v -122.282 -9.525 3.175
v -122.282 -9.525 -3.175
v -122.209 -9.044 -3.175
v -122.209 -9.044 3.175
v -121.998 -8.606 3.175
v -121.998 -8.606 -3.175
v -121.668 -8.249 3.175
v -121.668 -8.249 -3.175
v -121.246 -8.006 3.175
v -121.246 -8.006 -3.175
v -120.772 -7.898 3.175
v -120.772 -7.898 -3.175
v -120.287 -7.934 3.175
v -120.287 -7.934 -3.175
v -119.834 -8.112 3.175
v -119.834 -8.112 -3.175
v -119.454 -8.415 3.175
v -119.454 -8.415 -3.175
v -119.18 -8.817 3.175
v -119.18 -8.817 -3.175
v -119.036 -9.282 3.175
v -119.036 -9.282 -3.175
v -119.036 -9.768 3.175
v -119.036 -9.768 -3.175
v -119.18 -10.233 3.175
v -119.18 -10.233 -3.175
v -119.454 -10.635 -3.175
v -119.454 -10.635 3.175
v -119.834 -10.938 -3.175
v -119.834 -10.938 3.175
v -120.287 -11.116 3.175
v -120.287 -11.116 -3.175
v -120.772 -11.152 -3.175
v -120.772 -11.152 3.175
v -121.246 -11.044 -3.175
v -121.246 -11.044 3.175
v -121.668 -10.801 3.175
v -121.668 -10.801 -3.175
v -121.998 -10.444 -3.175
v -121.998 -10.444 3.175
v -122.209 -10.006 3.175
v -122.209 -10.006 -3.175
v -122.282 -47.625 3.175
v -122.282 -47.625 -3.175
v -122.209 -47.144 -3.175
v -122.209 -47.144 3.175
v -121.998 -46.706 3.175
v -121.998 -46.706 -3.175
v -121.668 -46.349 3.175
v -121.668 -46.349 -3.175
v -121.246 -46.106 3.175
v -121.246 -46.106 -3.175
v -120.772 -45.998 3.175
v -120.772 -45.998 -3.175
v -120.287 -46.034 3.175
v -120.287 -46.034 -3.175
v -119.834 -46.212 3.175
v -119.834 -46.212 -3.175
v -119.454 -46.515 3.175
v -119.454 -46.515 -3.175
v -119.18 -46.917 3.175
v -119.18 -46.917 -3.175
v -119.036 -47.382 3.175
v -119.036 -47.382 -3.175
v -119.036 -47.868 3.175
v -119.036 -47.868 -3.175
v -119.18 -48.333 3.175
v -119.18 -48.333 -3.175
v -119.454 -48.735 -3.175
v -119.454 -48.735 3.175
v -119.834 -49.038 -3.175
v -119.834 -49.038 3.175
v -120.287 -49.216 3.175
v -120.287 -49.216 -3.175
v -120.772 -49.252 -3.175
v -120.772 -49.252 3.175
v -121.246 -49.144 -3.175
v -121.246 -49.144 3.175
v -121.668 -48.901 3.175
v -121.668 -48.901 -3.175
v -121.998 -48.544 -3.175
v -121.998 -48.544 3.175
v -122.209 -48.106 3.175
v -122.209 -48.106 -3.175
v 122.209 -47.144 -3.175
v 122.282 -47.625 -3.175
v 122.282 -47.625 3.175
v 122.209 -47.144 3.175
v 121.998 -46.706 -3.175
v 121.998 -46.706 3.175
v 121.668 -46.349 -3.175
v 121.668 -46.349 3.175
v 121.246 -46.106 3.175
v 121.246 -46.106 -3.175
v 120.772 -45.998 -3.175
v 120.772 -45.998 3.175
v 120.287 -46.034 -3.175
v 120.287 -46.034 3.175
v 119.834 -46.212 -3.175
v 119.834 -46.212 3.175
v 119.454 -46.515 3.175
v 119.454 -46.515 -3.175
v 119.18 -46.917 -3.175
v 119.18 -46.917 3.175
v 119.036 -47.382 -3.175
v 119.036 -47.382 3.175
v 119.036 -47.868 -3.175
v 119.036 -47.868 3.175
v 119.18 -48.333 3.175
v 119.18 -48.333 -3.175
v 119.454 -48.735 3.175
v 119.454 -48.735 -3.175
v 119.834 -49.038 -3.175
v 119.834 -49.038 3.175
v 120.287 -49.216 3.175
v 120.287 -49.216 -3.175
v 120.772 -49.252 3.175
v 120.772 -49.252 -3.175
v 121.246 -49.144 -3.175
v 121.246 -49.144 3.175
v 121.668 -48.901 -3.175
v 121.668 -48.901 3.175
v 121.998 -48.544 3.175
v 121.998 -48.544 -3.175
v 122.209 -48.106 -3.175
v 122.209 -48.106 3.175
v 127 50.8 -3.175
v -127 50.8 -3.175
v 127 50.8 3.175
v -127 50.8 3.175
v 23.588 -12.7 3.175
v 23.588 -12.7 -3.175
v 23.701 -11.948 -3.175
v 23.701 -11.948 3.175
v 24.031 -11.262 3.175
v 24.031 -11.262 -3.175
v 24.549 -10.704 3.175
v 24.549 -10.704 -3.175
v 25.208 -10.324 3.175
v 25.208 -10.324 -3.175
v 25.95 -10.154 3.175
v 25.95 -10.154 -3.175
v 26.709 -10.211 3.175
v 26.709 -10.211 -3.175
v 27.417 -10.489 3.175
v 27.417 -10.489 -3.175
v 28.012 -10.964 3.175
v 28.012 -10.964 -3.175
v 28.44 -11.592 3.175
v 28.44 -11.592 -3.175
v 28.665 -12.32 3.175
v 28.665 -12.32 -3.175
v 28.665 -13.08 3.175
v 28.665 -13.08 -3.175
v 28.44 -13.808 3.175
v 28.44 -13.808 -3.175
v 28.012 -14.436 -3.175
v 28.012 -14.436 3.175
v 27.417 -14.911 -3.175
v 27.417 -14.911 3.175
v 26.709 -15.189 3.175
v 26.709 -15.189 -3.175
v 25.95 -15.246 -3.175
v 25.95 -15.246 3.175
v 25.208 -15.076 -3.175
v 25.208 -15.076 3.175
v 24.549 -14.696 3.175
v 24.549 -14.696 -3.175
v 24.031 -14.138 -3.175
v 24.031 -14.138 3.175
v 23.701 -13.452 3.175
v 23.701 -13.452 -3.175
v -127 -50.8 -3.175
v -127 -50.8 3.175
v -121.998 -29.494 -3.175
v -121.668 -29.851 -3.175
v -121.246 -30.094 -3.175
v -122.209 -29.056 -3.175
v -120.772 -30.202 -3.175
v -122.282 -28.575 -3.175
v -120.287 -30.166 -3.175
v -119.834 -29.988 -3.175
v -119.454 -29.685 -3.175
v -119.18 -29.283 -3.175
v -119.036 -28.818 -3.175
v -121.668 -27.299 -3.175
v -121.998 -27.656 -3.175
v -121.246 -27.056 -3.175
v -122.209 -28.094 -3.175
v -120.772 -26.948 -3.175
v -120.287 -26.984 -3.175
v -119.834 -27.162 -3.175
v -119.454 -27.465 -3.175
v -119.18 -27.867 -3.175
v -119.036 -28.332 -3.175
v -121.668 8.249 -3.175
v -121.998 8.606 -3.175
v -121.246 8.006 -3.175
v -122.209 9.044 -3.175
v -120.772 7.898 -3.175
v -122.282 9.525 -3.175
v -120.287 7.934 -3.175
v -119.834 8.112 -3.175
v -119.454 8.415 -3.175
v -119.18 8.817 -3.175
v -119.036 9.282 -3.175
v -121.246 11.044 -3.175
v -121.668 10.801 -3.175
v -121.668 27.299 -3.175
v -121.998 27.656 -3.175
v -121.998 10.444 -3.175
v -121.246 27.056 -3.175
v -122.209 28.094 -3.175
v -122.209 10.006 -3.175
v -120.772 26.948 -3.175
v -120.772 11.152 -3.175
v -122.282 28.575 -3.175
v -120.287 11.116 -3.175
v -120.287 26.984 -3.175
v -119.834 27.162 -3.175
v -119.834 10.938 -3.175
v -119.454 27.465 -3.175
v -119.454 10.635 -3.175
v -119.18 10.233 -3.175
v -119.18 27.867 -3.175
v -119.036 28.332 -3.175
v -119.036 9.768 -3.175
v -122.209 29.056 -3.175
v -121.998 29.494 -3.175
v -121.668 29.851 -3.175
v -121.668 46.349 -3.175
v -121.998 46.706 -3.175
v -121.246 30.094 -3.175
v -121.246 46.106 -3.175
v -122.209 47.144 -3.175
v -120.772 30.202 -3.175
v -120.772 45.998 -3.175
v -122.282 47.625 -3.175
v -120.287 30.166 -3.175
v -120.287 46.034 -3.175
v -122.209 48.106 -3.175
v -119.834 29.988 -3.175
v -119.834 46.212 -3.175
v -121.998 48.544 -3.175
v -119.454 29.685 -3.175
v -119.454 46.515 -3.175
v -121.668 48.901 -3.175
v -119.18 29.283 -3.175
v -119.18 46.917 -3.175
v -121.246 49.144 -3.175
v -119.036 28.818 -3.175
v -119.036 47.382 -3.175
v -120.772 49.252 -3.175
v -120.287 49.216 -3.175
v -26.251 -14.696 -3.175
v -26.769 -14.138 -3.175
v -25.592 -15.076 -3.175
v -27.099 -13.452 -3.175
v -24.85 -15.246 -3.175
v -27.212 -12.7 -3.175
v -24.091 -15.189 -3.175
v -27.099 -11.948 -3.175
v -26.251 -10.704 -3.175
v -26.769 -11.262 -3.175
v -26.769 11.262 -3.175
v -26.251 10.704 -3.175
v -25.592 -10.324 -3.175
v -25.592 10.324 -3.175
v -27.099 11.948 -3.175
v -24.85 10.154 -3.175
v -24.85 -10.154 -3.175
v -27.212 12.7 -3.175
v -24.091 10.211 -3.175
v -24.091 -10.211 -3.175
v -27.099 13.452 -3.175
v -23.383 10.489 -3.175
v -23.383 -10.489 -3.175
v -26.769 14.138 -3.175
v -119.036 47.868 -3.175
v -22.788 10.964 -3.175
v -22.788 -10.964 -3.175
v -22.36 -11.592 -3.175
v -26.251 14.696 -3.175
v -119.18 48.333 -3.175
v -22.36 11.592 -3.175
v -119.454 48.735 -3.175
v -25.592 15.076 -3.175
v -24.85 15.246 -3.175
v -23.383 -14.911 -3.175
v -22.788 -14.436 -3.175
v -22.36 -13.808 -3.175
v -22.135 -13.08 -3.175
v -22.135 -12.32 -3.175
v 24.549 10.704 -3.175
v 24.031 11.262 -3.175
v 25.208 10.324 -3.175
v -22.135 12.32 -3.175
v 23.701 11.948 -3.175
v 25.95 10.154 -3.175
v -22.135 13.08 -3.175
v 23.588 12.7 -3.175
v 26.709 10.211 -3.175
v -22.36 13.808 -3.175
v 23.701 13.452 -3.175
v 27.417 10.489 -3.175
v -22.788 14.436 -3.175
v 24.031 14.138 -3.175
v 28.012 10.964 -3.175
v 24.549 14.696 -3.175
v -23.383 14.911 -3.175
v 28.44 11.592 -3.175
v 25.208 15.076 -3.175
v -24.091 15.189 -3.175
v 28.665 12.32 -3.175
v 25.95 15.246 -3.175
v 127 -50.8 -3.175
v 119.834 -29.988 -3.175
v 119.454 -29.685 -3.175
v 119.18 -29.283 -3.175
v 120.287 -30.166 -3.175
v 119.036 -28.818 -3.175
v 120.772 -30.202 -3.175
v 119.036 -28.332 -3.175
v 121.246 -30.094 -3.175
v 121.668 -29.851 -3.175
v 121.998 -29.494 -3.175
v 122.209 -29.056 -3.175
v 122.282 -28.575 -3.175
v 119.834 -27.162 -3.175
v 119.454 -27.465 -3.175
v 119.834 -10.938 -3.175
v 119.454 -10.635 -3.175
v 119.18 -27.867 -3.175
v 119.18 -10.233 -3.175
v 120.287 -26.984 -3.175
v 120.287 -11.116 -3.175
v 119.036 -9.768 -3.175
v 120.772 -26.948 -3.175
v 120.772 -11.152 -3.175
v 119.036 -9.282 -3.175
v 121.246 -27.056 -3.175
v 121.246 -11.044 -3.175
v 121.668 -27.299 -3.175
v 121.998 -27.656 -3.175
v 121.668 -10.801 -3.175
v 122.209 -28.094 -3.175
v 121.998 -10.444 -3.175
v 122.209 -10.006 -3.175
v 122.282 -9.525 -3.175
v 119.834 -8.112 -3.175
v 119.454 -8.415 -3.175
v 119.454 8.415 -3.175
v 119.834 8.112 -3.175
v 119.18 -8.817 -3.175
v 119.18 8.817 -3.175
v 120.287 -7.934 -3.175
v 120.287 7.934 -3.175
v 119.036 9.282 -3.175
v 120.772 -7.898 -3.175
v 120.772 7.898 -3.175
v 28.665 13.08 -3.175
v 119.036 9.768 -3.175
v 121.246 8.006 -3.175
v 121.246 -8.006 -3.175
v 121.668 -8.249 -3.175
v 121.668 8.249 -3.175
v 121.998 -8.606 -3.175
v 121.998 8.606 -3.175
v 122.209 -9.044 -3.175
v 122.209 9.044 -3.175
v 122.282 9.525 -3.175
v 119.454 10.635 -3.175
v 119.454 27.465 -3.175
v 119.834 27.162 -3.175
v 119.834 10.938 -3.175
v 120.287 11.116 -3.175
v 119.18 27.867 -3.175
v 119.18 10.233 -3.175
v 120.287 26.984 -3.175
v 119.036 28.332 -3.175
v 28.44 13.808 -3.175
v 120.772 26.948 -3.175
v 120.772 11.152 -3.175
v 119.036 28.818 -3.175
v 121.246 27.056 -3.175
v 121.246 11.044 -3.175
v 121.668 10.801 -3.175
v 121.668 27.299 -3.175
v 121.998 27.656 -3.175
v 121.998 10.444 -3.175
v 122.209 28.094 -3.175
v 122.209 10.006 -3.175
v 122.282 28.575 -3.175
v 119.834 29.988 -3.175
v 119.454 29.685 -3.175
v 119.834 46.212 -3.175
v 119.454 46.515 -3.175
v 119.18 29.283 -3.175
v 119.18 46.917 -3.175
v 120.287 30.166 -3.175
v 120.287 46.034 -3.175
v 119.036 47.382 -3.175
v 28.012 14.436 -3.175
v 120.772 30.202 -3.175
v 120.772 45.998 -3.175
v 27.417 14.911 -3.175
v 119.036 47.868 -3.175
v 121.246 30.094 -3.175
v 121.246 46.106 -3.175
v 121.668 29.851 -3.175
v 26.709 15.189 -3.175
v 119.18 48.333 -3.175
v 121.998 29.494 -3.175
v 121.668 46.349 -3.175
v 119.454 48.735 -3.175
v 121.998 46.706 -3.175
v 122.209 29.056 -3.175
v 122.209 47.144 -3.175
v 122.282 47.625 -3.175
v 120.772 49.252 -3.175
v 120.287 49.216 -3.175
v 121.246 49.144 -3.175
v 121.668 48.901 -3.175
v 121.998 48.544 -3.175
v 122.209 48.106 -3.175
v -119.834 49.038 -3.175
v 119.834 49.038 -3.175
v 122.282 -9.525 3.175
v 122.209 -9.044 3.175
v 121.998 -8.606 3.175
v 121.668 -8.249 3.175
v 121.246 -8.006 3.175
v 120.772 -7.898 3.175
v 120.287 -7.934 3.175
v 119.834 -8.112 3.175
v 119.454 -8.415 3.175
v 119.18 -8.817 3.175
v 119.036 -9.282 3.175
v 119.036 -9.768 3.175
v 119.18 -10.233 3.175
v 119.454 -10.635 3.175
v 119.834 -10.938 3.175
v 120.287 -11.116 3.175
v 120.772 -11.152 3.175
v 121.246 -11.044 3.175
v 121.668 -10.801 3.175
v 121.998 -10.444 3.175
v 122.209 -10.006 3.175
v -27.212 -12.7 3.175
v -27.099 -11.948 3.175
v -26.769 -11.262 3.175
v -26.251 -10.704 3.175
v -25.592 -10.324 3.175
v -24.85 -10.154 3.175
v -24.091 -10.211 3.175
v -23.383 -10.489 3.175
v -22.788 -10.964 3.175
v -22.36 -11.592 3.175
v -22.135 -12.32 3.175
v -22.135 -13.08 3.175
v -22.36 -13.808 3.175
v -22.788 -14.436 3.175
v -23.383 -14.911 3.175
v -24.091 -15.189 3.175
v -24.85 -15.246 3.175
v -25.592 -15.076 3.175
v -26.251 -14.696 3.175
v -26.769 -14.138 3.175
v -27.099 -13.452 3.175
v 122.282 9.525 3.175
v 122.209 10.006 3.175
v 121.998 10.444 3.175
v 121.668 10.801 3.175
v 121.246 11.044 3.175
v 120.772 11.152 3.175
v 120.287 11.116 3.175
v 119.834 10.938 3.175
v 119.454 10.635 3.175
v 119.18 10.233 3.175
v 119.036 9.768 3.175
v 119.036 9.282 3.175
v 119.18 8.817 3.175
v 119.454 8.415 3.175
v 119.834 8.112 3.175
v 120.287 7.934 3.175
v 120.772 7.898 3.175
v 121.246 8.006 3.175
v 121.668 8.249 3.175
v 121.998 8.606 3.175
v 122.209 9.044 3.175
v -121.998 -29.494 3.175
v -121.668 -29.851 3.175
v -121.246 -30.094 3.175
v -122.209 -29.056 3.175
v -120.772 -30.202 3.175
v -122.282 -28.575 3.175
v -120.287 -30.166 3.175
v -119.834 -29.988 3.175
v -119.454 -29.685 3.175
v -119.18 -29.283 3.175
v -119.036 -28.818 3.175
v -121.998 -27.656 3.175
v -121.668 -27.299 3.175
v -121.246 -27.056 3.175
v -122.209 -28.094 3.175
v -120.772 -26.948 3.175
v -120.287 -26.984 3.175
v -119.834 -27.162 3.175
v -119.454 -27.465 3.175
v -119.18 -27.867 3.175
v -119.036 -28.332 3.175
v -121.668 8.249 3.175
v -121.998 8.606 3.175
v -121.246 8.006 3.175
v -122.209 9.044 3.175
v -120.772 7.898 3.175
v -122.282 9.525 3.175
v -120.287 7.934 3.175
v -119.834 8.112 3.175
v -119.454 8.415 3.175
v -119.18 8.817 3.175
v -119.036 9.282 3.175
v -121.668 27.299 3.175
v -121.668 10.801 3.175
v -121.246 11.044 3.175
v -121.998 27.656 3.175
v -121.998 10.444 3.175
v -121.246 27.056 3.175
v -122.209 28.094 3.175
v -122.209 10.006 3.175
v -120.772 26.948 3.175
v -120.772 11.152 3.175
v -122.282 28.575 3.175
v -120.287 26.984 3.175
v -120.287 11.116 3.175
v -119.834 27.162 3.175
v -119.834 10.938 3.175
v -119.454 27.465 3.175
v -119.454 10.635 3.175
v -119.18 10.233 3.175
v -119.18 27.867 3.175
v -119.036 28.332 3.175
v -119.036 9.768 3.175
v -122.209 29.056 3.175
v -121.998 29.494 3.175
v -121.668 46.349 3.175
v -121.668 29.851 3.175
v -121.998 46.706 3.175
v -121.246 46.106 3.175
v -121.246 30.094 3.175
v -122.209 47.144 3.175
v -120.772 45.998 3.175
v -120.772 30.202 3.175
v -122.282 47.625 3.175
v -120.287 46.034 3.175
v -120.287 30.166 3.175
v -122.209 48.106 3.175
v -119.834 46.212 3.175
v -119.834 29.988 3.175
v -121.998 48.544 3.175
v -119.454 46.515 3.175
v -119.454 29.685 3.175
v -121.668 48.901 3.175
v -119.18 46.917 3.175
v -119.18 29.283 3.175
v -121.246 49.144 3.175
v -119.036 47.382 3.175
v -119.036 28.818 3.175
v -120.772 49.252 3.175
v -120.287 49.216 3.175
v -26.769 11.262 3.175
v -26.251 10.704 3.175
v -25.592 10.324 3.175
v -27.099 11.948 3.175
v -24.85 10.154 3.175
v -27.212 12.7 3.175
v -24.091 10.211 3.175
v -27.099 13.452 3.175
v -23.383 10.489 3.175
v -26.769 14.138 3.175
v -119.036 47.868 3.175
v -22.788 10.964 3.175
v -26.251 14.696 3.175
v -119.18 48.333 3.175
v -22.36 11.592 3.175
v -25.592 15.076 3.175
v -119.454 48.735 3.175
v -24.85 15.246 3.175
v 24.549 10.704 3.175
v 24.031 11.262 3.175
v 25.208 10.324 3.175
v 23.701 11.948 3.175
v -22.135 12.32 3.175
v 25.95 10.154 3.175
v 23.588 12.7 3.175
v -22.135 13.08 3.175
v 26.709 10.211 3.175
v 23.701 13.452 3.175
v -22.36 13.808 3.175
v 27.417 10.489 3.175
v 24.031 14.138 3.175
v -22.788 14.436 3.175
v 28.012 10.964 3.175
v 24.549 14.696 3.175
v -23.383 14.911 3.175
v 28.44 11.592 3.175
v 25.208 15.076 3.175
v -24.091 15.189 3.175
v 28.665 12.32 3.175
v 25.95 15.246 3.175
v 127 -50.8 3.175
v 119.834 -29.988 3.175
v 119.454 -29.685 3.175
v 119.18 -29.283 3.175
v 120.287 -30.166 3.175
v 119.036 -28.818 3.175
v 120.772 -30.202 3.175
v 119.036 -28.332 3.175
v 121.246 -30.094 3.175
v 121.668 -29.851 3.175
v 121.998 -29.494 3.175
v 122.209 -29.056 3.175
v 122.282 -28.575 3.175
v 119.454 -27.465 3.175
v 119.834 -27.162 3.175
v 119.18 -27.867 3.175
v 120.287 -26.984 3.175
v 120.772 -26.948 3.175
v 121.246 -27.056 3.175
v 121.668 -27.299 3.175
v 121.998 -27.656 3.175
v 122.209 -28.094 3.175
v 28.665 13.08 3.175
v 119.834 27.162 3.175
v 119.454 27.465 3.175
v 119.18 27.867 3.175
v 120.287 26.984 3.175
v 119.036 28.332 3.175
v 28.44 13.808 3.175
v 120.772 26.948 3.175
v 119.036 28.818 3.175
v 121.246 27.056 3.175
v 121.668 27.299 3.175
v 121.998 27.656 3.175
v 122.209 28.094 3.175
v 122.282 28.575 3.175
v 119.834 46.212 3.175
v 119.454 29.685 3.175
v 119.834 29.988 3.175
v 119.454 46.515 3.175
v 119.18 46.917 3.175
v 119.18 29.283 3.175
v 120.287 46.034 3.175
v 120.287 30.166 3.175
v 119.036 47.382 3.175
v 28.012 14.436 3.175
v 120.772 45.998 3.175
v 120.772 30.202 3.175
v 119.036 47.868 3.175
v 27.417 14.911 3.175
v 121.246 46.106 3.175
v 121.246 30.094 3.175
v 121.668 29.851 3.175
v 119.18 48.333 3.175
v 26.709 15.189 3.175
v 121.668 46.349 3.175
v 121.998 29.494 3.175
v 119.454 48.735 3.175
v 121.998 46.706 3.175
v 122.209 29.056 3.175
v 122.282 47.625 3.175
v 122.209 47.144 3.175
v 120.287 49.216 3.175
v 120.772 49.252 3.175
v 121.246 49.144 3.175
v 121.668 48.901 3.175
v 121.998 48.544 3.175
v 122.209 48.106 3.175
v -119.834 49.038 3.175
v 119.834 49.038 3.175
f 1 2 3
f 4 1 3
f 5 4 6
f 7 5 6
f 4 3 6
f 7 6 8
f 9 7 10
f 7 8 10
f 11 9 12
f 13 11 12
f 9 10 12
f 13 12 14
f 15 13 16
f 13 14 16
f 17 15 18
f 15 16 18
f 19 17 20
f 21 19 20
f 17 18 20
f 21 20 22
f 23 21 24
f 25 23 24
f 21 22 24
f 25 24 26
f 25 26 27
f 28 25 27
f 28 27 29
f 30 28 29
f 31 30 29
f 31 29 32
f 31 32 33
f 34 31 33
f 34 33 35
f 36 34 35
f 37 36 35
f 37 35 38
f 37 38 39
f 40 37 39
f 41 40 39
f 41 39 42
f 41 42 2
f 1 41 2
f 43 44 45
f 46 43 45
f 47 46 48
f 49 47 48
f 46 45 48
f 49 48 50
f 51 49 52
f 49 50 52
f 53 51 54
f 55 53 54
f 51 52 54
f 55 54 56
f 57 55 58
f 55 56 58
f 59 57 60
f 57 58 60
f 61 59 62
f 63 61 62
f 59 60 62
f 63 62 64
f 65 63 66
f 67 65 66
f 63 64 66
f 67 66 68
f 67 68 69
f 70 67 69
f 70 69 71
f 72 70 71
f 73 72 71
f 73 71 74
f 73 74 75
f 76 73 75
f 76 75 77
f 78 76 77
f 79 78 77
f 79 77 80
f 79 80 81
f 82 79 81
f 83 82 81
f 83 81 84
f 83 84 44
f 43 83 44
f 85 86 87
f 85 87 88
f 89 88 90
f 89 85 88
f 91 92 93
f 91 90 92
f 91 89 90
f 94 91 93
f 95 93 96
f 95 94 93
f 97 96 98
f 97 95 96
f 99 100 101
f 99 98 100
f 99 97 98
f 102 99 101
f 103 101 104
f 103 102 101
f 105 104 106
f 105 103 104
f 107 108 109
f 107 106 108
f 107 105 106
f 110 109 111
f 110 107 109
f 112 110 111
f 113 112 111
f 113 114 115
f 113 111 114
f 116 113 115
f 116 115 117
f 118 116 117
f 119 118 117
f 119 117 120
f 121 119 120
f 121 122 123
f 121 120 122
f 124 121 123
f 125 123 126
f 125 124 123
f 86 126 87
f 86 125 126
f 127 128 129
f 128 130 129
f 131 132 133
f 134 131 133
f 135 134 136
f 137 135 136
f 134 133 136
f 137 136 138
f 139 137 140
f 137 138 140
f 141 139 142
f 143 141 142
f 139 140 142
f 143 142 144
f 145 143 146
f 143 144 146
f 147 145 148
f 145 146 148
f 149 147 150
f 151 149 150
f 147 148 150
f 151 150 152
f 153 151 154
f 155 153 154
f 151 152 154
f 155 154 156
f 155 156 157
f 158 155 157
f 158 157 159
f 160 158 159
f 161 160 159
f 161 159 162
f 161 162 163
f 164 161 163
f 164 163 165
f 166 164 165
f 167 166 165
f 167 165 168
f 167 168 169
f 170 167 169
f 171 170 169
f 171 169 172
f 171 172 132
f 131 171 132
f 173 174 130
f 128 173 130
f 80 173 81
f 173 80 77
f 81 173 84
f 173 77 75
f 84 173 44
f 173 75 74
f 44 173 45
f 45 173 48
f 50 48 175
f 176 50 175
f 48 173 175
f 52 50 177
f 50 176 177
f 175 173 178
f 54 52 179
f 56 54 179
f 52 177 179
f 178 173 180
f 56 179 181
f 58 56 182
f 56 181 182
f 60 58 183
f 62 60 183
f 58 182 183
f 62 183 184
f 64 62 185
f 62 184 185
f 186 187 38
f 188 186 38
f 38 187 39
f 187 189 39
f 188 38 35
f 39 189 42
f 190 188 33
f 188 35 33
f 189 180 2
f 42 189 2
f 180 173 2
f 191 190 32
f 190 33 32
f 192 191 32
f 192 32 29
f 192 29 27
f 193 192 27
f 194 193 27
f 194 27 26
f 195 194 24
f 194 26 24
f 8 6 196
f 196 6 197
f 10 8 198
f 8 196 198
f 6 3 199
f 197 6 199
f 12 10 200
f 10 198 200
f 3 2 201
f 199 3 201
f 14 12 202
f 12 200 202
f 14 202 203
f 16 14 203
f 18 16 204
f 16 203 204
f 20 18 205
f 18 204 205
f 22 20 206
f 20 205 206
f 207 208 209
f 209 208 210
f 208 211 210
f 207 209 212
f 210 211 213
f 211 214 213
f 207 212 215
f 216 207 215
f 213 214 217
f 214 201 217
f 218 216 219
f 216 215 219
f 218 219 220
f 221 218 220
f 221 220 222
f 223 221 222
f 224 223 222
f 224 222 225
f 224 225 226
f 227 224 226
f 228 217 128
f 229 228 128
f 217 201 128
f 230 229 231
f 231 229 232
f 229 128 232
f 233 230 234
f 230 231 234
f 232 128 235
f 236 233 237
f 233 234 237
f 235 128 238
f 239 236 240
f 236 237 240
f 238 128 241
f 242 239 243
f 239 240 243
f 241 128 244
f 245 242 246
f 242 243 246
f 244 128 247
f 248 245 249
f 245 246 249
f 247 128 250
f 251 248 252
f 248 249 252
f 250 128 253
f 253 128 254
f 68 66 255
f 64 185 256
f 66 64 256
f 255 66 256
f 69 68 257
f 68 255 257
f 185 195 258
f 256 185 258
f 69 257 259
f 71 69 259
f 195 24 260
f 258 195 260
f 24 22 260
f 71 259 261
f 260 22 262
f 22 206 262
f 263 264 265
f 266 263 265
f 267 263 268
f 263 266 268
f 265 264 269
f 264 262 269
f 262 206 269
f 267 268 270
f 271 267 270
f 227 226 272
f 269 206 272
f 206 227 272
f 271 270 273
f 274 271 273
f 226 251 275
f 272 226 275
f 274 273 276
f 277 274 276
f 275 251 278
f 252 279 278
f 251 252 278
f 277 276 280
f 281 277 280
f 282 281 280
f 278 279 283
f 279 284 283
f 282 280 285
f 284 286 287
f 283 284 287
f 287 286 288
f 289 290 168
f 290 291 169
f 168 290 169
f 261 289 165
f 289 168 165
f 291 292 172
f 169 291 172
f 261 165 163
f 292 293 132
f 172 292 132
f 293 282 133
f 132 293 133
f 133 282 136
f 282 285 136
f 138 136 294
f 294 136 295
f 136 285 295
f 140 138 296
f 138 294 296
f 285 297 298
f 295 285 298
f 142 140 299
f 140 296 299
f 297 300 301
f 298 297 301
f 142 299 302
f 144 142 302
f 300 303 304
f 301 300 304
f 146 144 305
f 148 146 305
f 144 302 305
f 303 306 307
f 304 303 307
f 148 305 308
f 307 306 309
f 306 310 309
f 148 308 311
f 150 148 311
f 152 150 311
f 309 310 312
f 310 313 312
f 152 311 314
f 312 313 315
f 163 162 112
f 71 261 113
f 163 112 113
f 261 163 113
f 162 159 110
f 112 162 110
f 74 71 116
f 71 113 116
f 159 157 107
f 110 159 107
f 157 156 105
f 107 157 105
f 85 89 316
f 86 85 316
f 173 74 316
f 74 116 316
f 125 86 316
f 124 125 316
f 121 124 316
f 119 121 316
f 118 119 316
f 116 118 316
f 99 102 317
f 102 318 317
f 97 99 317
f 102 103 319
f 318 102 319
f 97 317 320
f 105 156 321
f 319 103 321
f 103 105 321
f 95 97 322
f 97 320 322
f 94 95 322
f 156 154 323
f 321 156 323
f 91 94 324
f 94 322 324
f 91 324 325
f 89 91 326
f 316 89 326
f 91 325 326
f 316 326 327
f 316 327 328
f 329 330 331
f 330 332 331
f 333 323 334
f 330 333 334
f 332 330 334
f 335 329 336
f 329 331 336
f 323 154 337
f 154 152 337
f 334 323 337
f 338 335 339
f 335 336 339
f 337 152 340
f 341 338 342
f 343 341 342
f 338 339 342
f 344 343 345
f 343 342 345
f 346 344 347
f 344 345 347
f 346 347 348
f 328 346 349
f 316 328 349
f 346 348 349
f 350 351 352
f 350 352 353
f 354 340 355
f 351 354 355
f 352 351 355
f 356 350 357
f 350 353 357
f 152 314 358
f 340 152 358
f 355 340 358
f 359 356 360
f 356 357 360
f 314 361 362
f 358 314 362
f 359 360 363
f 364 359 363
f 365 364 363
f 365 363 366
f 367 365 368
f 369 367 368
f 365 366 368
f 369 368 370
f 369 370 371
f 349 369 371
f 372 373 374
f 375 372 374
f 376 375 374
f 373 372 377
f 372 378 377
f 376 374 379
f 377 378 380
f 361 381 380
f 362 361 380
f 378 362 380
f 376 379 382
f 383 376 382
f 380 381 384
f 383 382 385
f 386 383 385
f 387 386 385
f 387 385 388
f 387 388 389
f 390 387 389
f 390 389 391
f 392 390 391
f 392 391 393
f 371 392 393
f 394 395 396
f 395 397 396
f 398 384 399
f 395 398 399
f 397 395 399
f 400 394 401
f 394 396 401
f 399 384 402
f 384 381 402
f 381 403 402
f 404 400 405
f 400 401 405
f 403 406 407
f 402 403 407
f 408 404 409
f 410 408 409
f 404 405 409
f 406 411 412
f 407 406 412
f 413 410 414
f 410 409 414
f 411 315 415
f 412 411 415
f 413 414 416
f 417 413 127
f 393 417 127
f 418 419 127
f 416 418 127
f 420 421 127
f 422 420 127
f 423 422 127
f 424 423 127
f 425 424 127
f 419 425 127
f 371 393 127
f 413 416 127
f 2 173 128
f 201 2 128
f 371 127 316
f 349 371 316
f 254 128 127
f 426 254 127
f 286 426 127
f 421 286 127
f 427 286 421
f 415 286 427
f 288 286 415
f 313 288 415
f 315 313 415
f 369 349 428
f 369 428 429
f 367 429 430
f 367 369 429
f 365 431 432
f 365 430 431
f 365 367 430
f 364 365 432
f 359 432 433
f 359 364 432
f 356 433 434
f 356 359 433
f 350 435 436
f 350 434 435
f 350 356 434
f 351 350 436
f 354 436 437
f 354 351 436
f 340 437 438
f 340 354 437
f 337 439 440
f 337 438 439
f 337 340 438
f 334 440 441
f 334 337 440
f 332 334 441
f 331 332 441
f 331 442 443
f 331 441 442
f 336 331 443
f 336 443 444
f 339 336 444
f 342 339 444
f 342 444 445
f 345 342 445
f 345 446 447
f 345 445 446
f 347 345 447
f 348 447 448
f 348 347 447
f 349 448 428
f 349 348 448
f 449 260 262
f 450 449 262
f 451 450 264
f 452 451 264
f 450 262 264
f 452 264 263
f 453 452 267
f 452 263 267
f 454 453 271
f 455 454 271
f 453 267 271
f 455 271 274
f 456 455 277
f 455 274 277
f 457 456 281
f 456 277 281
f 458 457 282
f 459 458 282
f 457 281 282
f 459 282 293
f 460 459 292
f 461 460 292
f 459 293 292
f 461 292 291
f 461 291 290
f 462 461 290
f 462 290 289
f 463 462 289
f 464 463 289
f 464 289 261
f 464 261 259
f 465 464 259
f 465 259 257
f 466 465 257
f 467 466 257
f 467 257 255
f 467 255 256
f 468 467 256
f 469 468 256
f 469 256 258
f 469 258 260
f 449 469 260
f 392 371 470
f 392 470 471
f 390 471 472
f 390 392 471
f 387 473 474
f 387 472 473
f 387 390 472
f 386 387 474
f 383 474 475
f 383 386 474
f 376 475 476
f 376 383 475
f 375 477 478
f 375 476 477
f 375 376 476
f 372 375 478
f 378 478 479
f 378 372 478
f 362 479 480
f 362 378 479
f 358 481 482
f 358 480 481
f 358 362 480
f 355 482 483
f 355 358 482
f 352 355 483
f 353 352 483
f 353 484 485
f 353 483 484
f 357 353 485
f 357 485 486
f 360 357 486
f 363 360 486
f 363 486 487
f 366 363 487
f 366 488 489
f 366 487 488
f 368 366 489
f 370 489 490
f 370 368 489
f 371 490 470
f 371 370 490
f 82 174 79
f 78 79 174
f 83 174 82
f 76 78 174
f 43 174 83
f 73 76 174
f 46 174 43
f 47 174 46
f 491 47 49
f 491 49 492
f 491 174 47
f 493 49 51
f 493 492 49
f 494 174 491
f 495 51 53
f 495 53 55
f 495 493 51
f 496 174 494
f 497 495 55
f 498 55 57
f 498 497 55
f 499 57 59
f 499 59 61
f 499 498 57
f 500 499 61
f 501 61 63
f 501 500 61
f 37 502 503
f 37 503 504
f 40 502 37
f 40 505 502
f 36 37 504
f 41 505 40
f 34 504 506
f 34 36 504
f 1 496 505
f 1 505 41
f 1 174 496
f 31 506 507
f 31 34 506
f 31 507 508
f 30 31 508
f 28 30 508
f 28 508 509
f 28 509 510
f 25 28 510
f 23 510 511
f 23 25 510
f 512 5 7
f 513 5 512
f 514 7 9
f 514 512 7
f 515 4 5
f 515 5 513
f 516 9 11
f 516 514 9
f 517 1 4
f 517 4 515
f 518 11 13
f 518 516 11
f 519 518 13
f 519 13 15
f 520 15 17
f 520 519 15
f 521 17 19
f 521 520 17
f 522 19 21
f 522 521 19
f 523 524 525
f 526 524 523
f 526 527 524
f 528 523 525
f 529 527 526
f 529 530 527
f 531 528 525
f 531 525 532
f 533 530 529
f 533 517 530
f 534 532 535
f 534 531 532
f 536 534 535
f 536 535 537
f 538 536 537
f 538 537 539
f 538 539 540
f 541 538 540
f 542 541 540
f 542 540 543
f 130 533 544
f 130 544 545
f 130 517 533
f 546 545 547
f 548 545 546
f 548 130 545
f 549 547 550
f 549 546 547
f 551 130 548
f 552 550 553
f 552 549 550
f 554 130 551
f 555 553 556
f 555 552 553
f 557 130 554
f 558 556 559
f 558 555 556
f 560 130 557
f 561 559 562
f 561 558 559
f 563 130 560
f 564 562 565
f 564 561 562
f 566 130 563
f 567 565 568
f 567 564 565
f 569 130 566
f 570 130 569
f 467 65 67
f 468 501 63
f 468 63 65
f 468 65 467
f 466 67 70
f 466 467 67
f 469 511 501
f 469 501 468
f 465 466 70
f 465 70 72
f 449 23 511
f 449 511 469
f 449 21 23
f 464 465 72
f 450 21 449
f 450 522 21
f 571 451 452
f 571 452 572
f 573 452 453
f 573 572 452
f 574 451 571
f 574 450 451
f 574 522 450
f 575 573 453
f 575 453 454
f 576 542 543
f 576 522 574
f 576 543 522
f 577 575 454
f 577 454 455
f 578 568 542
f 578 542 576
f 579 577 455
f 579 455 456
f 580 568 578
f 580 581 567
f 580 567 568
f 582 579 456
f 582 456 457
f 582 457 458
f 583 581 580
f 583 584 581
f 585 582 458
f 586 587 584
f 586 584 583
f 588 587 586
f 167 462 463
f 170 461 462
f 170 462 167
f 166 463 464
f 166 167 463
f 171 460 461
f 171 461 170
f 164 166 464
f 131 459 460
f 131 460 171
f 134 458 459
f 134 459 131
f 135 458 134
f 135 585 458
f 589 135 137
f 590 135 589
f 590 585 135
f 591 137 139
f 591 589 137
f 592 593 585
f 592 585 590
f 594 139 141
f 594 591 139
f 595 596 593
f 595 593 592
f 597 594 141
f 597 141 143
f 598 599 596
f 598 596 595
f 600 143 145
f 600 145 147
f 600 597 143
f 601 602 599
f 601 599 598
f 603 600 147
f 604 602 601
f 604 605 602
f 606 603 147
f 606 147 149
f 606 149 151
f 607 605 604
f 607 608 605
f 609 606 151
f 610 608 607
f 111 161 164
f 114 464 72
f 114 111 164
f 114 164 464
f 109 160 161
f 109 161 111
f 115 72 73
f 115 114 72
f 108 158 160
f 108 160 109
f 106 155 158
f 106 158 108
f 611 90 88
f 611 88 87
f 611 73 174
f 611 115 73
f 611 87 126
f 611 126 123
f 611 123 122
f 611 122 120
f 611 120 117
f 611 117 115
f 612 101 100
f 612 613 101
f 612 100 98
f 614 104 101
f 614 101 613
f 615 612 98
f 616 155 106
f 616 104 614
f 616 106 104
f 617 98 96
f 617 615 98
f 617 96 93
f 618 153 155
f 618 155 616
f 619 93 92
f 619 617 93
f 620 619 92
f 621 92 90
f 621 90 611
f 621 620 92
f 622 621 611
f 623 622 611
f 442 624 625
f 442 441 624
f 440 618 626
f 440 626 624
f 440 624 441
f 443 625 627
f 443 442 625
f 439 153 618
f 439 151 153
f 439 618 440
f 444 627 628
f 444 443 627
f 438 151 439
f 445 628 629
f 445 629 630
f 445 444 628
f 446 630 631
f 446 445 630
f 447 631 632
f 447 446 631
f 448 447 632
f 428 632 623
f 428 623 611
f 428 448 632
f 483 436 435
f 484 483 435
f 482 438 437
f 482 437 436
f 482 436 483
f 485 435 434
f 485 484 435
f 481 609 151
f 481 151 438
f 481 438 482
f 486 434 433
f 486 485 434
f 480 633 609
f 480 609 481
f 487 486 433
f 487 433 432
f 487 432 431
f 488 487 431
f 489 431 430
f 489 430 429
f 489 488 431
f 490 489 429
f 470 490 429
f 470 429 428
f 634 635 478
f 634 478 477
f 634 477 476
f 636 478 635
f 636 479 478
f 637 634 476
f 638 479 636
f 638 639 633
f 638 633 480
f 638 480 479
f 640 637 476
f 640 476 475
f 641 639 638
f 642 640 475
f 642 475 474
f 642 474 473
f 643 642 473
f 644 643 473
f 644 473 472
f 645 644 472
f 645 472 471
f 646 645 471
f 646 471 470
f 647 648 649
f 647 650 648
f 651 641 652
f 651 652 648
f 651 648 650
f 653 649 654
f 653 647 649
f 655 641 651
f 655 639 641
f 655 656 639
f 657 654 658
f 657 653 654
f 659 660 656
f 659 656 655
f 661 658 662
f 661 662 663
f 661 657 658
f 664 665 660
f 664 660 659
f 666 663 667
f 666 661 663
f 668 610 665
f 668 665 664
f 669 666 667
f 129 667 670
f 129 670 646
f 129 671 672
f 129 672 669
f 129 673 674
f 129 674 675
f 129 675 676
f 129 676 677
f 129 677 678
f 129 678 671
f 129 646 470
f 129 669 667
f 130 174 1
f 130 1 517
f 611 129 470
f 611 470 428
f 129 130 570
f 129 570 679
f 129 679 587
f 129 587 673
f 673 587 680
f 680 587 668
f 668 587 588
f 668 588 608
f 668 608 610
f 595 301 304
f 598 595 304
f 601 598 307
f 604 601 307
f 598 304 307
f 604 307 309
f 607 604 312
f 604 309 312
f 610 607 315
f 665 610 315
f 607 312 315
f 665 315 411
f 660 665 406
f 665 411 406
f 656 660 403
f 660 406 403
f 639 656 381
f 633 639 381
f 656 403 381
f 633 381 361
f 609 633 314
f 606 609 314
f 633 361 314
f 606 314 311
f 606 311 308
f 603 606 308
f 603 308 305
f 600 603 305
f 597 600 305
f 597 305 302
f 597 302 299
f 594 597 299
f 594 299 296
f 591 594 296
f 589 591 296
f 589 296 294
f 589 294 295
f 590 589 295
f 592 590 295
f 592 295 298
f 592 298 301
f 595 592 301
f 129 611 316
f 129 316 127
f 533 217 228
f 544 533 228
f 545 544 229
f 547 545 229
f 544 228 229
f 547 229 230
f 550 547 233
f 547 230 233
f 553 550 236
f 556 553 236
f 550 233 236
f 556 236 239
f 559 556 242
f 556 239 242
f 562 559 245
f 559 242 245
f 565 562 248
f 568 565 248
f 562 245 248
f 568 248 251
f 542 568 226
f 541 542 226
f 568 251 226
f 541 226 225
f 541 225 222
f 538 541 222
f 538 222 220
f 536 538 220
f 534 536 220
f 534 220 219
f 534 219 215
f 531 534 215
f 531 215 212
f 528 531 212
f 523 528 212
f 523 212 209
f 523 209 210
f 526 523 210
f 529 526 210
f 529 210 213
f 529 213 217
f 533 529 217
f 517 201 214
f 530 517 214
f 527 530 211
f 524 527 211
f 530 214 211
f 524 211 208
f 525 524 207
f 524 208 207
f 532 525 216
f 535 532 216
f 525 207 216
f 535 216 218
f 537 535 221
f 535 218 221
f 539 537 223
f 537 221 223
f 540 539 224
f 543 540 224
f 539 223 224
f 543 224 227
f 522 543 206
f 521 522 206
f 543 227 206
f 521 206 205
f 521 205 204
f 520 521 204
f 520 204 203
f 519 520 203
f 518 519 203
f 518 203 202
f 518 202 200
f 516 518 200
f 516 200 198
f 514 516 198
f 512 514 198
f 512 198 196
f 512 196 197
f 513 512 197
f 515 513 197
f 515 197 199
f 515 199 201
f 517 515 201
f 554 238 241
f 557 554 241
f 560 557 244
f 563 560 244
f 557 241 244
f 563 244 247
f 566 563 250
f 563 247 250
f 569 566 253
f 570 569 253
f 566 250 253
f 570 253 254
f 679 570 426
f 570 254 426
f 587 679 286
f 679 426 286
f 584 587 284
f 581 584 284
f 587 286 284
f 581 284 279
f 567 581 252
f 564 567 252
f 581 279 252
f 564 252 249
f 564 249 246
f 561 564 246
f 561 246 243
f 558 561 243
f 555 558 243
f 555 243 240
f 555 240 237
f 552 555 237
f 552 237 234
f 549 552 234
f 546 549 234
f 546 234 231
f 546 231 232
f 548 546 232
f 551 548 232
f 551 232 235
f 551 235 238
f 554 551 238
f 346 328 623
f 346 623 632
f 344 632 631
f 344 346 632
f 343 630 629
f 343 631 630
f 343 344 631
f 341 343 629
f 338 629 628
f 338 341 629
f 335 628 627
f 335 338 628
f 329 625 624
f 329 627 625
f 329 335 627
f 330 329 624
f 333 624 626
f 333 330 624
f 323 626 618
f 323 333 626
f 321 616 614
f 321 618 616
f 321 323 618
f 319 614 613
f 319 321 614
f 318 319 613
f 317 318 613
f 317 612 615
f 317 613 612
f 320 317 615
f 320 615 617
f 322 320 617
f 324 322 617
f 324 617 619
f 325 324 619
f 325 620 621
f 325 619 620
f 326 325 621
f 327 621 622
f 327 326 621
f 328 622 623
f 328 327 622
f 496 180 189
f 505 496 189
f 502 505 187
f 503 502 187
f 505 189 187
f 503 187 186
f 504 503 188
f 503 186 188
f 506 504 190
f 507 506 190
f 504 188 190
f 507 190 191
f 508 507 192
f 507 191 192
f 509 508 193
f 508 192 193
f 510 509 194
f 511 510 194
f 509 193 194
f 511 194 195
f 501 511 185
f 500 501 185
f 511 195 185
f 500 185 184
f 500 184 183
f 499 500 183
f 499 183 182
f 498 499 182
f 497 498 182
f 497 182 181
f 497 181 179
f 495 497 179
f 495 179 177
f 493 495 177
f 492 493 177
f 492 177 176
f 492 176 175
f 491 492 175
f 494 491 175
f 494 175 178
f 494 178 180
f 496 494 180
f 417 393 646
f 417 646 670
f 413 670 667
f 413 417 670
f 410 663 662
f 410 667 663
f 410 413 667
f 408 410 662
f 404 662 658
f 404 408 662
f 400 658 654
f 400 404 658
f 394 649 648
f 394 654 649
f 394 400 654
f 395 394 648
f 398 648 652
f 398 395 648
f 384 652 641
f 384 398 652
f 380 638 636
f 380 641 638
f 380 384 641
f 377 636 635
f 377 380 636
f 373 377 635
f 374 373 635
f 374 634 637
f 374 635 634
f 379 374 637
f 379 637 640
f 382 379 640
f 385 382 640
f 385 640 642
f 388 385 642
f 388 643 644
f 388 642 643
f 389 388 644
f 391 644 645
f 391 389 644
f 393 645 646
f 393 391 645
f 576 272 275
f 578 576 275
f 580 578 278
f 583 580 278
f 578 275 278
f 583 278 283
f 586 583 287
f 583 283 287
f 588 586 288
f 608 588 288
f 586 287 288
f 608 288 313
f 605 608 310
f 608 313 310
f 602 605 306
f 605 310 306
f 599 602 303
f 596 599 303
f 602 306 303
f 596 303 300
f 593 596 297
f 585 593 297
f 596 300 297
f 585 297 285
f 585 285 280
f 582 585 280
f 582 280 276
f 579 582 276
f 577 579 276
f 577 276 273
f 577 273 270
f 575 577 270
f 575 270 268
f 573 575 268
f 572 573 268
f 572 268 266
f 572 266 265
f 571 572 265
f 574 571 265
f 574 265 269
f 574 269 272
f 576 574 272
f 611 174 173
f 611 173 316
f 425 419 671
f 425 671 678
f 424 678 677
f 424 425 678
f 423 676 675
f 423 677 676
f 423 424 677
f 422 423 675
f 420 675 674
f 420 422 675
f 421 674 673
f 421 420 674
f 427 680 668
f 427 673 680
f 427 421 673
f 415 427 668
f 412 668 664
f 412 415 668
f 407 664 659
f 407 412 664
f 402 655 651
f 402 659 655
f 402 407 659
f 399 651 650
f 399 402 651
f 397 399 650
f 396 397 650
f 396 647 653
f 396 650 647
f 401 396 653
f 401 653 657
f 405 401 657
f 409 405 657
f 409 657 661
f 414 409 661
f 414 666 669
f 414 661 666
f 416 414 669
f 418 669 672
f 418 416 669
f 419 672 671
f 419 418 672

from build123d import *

# Parameters (mm, degrees)
SKETCH1_W              = 254
SKETCH1_H              = 101.6
BOSS_EXTRUDE1_DEPTH    = 3.175
F_4_CLEARANCE_HOLE1_D  = 3.2639
F_10_CLEARANCE_HOLE1_D = 5.1054


with BuildPart() as part:
    # Sketch1 → Boss-Extrude1 (new, symmetric)
    with BuildSketch(Plane.XY):
        Rectangle(SKETCH1_W, SKETCH1_H)
    extrude(amount=BOSS_EXTRUDE1_DEPTH, both=True)

    # #4 Clearance Hole1 (through all)
    with Locations(Plane.XY.offset(3.175)):
        with Locations((-120.65, 47.625), (-120.65, 28.575), (-120.65, 9.525), (-120.65, -9.525), (-120.65, -28.575), (-120.65, -47.625)):
            f_4_clearance_hole1 = Hole(F_4_CLEARANCE_HOLE1_D / 2)

    # Mirror1: #4 Clearance Hole1 across plane
    add(f_4_clearance_hole1.mirror(Plane(origin=(0, 0, 0), x_dir=(0, 0, 1), z_dir=(1, 0, 0))), mode=Mode.SUBTRACT)

    # #10 Clearance Hole1 (through all)
    with Locations(Plane.XY.offset(3.175)):
        with Locations((-24.659484021, 12.7), (26.140515979, 12.7), (26.140515979, -12.7), (-24.659484021, -12.7)):
            Hole(F_10_CLEARANCE_HOLE1_D / 2)


solid = part.part
